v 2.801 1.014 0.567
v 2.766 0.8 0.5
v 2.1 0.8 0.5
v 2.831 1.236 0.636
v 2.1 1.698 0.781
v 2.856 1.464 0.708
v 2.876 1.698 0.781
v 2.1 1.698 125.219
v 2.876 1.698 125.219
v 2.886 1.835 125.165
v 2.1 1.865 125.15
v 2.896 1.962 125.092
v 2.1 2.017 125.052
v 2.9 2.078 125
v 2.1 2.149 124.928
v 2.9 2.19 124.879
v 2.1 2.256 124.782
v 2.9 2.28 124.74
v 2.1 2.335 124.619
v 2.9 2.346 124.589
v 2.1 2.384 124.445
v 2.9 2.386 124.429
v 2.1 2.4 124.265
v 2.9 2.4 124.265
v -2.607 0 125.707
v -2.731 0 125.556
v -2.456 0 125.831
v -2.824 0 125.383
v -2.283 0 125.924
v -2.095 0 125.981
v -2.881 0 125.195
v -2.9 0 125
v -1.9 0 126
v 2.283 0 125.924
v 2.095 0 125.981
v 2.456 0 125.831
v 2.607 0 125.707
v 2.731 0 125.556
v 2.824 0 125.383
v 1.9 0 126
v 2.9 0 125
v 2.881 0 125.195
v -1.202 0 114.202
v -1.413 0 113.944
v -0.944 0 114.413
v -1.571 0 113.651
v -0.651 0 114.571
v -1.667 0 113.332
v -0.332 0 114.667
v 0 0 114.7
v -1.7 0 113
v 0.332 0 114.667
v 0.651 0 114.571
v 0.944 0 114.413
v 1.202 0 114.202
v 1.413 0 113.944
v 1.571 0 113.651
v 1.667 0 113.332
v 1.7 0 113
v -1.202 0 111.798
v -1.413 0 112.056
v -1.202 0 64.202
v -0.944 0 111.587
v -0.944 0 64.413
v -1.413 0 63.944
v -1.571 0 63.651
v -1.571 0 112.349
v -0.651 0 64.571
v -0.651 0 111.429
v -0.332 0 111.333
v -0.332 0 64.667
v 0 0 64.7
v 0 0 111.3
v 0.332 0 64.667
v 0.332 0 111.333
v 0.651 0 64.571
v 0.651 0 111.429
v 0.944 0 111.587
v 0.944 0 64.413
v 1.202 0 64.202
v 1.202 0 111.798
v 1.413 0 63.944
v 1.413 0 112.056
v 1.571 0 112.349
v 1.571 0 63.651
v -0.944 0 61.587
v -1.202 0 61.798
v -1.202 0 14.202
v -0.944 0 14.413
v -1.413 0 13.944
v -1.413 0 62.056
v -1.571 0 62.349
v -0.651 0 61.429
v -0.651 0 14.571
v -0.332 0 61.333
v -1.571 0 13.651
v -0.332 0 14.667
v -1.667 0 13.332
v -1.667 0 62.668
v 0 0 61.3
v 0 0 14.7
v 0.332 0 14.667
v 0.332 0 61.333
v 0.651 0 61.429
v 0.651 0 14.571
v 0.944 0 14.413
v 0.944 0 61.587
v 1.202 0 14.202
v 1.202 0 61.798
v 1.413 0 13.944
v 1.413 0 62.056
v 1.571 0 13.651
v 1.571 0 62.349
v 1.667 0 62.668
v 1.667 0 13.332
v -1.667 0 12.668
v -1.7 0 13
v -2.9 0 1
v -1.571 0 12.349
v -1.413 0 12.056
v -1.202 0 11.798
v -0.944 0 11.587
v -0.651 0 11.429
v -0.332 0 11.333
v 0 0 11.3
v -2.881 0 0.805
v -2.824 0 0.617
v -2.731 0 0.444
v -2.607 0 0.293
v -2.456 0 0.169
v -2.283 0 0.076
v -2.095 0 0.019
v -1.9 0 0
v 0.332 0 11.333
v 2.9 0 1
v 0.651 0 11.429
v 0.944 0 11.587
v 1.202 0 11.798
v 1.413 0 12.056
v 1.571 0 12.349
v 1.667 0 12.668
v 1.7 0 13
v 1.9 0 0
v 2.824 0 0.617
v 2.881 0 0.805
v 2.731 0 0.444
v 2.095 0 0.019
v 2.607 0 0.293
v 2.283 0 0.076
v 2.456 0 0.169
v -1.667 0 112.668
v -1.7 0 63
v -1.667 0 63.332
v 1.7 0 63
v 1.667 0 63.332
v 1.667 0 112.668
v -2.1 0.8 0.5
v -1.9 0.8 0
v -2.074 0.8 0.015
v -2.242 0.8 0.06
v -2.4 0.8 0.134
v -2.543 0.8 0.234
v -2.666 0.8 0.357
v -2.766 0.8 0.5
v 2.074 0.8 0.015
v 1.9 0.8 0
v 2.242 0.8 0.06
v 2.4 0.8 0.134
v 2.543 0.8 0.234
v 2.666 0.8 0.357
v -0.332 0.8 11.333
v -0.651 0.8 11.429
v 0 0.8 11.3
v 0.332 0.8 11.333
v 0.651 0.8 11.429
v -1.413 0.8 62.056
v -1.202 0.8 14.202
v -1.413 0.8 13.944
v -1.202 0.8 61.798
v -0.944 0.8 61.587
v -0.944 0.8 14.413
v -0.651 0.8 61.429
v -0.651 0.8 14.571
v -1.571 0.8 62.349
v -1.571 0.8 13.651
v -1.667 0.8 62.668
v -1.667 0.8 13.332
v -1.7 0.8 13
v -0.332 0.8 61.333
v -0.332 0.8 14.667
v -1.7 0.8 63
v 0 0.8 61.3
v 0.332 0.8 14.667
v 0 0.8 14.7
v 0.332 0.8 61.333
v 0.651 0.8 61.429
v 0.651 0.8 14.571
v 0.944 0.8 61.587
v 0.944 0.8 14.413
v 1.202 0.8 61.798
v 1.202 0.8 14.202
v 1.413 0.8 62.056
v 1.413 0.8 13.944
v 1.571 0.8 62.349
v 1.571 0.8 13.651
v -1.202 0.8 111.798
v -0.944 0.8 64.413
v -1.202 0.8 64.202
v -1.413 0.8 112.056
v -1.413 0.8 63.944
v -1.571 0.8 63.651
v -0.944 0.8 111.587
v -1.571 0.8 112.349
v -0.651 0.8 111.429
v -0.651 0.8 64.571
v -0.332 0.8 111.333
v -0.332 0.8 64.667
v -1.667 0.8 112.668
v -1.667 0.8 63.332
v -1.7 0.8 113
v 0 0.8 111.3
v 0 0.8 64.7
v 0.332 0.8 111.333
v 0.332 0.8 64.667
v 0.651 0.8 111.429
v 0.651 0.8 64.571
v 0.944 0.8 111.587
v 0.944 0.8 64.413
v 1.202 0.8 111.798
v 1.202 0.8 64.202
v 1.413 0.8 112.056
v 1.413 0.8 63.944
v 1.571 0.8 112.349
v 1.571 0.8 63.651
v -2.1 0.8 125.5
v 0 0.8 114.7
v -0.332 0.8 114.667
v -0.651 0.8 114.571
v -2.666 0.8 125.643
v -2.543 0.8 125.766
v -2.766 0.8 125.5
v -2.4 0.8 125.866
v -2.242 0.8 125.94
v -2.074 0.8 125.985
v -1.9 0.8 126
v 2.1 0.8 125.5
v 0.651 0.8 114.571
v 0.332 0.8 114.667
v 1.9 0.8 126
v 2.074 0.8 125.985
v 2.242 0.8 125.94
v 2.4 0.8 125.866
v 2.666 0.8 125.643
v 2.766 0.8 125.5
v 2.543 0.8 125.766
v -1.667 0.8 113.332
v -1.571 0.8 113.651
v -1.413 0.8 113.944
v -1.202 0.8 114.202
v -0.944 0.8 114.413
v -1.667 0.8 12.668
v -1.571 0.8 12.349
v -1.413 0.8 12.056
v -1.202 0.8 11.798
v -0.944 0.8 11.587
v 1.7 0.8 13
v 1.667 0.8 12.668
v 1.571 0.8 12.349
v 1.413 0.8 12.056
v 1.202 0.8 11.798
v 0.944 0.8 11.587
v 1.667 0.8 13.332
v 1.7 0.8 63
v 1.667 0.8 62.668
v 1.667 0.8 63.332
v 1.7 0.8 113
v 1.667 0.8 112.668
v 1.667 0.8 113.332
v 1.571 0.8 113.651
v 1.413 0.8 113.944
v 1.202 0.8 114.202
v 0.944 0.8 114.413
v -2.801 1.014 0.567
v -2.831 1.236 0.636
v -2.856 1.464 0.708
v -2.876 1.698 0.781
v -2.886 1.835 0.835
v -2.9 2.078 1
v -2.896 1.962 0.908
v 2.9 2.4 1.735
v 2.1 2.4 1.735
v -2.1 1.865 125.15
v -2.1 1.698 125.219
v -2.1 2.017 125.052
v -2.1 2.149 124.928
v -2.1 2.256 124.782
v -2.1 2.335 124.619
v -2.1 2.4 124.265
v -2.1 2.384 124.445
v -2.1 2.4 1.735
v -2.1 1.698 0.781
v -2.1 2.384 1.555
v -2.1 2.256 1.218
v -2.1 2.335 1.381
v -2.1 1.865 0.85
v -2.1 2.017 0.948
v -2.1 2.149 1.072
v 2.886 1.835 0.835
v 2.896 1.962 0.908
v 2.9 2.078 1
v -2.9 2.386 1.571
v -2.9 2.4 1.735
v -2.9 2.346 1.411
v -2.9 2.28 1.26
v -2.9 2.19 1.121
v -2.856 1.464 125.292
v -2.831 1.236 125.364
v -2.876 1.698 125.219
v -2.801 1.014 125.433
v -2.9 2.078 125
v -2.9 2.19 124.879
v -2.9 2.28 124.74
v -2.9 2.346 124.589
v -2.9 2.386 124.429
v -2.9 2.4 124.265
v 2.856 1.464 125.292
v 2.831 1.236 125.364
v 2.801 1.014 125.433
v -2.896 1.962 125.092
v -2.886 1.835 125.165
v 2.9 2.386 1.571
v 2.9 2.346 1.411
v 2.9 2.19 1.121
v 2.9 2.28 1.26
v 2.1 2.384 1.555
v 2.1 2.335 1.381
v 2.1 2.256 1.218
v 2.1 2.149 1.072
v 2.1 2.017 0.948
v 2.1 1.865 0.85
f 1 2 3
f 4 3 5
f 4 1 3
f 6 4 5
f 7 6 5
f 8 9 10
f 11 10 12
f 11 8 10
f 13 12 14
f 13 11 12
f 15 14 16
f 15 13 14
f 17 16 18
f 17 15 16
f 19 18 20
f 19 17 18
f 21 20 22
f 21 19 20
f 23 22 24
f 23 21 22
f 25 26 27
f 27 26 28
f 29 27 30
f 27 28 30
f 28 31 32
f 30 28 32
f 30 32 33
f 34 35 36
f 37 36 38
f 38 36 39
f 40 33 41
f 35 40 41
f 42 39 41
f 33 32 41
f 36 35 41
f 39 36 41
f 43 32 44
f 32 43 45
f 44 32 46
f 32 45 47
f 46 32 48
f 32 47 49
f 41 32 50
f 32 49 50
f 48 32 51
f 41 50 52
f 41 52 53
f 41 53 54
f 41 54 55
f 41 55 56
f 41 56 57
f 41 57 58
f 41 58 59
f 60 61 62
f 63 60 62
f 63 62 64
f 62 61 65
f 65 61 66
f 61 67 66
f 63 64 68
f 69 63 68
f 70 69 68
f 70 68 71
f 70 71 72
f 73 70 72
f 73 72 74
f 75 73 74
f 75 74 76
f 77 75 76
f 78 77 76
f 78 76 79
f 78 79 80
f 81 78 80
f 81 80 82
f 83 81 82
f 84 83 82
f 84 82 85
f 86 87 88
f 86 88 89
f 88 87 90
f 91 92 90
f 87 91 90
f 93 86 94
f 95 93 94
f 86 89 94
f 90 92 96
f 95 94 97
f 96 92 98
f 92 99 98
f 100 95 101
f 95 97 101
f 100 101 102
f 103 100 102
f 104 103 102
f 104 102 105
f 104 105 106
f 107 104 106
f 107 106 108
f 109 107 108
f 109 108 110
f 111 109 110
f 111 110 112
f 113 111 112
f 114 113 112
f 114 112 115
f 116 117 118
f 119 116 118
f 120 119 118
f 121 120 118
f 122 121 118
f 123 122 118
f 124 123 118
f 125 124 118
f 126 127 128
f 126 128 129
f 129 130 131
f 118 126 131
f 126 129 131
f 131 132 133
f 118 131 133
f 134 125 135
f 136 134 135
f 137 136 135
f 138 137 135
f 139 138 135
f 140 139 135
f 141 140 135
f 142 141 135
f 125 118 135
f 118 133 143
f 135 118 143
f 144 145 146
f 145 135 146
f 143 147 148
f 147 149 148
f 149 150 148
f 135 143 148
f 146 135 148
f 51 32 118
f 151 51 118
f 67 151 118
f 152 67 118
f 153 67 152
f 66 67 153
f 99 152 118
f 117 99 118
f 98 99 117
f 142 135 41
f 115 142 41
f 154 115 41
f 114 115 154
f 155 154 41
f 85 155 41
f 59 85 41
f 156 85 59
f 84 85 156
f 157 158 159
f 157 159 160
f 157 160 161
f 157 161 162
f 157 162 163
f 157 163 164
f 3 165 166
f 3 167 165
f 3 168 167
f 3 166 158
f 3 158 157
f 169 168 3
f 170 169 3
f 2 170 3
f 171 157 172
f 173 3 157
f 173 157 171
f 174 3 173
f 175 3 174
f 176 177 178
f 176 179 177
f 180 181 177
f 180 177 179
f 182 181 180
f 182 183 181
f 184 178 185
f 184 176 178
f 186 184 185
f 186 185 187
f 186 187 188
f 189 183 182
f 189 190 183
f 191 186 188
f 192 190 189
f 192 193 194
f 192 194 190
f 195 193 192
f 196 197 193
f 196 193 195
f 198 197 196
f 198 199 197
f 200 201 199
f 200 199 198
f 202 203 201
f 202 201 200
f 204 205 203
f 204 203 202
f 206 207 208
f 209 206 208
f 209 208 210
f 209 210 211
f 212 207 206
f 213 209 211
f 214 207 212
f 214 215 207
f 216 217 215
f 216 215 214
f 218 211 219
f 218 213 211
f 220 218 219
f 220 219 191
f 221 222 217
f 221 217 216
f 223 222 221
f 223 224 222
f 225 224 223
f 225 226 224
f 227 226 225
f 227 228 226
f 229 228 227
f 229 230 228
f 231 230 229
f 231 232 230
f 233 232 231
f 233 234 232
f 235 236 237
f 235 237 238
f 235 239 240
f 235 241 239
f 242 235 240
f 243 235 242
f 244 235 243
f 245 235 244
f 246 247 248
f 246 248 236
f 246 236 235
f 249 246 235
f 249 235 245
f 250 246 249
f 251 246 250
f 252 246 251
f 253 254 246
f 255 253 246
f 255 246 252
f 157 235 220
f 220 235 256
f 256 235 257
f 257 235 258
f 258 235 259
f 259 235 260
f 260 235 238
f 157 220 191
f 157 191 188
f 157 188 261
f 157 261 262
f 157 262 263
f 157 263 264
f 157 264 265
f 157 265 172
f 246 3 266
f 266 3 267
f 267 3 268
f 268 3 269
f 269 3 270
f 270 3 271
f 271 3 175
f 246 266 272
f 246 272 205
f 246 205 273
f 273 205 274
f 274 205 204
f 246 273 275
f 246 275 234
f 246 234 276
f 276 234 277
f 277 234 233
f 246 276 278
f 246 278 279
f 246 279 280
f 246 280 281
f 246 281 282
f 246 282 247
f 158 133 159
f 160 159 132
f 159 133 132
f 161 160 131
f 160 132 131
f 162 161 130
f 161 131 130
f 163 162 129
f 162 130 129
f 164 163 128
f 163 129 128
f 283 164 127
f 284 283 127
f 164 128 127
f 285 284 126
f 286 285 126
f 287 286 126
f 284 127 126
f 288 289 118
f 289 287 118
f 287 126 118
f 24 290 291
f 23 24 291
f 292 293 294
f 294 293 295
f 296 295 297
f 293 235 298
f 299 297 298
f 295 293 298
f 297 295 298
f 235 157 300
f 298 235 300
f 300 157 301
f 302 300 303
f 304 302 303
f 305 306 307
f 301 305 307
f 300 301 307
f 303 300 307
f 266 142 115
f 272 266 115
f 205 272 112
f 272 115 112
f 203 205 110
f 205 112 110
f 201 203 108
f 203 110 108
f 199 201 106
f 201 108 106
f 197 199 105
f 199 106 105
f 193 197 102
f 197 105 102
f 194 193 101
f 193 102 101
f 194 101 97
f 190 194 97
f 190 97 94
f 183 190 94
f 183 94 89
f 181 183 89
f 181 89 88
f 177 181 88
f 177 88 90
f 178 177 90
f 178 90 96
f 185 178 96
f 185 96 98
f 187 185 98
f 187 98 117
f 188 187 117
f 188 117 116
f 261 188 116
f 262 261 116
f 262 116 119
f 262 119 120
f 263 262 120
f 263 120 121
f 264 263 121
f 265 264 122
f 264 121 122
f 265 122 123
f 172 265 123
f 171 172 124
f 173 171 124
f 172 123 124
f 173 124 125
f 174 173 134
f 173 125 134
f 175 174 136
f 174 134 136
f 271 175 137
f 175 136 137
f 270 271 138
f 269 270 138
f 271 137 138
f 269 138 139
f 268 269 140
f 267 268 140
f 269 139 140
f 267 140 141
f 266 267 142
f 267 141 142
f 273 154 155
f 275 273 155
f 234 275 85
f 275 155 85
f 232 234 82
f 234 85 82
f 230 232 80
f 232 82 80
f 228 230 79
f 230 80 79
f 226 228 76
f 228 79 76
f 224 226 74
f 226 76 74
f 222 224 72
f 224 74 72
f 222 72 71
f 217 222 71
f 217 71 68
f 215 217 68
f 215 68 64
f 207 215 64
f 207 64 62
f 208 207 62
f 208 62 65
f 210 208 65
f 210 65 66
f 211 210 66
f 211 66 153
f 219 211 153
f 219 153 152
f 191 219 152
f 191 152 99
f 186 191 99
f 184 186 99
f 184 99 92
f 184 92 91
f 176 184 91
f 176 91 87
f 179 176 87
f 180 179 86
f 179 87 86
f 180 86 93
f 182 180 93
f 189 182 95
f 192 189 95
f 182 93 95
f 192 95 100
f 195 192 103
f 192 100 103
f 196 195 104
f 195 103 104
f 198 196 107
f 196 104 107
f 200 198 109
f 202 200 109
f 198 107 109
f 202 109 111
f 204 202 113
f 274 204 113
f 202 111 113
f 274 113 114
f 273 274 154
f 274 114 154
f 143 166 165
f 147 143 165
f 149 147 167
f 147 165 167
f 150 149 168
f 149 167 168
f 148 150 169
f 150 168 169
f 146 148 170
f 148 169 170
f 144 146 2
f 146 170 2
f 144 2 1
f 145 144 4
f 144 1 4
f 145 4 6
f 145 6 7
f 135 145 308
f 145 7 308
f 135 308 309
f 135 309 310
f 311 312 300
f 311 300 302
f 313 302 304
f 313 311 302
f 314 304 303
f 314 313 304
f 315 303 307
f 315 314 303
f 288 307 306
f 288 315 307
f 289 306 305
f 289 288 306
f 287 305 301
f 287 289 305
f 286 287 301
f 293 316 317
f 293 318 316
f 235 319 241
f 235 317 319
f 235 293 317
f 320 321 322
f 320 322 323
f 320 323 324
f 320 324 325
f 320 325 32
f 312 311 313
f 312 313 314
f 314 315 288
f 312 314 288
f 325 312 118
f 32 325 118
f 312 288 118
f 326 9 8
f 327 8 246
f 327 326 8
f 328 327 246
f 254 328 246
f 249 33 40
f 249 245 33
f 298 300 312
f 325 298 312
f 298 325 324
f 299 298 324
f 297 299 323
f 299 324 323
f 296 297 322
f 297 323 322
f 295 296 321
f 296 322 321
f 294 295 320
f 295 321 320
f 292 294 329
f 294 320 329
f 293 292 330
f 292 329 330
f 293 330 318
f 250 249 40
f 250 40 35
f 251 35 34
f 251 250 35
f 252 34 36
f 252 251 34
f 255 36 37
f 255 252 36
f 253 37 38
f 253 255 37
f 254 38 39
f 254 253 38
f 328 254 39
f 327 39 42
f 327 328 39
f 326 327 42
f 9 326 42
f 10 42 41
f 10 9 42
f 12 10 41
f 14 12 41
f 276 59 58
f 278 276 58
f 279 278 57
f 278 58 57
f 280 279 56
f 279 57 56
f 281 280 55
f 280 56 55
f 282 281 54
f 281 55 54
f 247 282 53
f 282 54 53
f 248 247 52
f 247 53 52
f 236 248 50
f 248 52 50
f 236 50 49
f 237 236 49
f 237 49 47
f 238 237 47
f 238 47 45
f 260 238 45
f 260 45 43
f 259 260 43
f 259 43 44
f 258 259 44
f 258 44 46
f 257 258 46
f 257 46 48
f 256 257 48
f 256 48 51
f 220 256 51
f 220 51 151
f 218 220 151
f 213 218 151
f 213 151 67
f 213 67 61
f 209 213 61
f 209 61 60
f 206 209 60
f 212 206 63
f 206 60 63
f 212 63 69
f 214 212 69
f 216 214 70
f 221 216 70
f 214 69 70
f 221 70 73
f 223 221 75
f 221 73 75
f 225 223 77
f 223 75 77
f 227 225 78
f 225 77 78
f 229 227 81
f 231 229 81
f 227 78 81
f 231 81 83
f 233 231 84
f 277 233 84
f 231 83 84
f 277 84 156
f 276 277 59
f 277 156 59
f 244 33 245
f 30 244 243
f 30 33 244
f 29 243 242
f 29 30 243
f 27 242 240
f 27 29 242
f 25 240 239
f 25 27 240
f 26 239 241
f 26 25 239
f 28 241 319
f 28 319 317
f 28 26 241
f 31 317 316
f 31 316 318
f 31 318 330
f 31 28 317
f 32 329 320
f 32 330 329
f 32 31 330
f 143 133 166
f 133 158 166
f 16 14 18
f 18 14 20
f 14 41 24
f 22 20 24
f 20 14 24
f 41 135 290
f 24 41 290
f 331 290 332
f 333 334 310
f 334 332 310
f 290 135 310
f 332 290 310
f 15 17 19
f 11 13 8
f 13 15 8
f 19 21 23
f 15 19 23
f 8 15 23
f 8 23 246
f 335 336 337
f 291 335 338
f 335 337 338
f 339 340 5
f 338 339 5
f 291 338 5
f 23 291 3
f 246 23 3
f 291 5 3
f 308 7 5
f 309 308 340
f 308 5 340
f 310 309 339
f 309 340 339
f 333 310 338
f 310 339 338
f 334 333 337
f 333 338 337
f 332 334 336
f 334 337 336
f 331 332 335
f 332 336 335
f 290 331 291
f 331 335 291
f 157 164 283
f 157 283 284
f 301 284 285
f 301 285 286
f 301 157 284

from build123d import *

# Parameters (mm, degrees)
PAD_DEPTH       = 126
POCKET_DEPTH    = 5.801
FILLET_R        = 1
FILLET001_R     = 1
SKETCH002_R     = 1.7
POCKET001_DEPTH = 5


with BuildPart() as part:
    # Sketch → Pad (new body)
    with BuildSketch(Plane.XY):
        Polygon((-2.9, 0), (2.9, 0), (2.9, 2.4), (2.1, 2.4), (2.1, 0.8), (-2.1, 0.8), (-2.1, 2.4), (-2.9, 2.4), align=None)
    extrude(amount=PAD_DEPTH)

    # Sketch001 → Pocket (cut, through all)
    with BuildSketch(Plane.YZ.offset(2.9)):
        Polygon((0.8, 0), (0.8, 0.5), (2.4, 1), (2.4, 0), align=None)
        Polygon((0.8, 126), (2.4, 126), (2.4, 125), (0.8, 125.5), align=None)
    extrude(amount=-POCKET_DEPTH, mode=Mode.SUBTRACT)

    # Fillet
    fillet_edges = [part.edges().sort_by_distance(p)[0] for p in [
        (2.9, 0.4, 126),
        (-2.9, 0.4, 126),
        (2.9, 0.4, 0),
        (-2.9, 0.4, 0),
    ]]
    fillet(fillet_edges, radius=FILLET_R)

    # Fillet001
    fillet001_edges = [part.edges().sort_by_distance(p)[0] for p in [
        (2.5, 2.4, 1),
        (-2.5, 2.4, 1),
        (2.5, 2.4, 125),
        (-2.5, 2.4, 125),
    ]]
    fillet(fillet001_edges, radius=FILLET001_R)

    # Sketch002 → Pocket001 (cut)
    with BuildSketch(Plane.XZ):
        with Locations((0, 63)):
            Circle(SKETCH002_R)
        with Locations((0, 113)):
            Circle(SKETCH002_R)
        with Locations((0, 13)):
            Circle(SKETCH002_R)
    extrude(amount=-POCKET001_DEPTH, mode=Mode.SUBTRACT)


solid = part.part
